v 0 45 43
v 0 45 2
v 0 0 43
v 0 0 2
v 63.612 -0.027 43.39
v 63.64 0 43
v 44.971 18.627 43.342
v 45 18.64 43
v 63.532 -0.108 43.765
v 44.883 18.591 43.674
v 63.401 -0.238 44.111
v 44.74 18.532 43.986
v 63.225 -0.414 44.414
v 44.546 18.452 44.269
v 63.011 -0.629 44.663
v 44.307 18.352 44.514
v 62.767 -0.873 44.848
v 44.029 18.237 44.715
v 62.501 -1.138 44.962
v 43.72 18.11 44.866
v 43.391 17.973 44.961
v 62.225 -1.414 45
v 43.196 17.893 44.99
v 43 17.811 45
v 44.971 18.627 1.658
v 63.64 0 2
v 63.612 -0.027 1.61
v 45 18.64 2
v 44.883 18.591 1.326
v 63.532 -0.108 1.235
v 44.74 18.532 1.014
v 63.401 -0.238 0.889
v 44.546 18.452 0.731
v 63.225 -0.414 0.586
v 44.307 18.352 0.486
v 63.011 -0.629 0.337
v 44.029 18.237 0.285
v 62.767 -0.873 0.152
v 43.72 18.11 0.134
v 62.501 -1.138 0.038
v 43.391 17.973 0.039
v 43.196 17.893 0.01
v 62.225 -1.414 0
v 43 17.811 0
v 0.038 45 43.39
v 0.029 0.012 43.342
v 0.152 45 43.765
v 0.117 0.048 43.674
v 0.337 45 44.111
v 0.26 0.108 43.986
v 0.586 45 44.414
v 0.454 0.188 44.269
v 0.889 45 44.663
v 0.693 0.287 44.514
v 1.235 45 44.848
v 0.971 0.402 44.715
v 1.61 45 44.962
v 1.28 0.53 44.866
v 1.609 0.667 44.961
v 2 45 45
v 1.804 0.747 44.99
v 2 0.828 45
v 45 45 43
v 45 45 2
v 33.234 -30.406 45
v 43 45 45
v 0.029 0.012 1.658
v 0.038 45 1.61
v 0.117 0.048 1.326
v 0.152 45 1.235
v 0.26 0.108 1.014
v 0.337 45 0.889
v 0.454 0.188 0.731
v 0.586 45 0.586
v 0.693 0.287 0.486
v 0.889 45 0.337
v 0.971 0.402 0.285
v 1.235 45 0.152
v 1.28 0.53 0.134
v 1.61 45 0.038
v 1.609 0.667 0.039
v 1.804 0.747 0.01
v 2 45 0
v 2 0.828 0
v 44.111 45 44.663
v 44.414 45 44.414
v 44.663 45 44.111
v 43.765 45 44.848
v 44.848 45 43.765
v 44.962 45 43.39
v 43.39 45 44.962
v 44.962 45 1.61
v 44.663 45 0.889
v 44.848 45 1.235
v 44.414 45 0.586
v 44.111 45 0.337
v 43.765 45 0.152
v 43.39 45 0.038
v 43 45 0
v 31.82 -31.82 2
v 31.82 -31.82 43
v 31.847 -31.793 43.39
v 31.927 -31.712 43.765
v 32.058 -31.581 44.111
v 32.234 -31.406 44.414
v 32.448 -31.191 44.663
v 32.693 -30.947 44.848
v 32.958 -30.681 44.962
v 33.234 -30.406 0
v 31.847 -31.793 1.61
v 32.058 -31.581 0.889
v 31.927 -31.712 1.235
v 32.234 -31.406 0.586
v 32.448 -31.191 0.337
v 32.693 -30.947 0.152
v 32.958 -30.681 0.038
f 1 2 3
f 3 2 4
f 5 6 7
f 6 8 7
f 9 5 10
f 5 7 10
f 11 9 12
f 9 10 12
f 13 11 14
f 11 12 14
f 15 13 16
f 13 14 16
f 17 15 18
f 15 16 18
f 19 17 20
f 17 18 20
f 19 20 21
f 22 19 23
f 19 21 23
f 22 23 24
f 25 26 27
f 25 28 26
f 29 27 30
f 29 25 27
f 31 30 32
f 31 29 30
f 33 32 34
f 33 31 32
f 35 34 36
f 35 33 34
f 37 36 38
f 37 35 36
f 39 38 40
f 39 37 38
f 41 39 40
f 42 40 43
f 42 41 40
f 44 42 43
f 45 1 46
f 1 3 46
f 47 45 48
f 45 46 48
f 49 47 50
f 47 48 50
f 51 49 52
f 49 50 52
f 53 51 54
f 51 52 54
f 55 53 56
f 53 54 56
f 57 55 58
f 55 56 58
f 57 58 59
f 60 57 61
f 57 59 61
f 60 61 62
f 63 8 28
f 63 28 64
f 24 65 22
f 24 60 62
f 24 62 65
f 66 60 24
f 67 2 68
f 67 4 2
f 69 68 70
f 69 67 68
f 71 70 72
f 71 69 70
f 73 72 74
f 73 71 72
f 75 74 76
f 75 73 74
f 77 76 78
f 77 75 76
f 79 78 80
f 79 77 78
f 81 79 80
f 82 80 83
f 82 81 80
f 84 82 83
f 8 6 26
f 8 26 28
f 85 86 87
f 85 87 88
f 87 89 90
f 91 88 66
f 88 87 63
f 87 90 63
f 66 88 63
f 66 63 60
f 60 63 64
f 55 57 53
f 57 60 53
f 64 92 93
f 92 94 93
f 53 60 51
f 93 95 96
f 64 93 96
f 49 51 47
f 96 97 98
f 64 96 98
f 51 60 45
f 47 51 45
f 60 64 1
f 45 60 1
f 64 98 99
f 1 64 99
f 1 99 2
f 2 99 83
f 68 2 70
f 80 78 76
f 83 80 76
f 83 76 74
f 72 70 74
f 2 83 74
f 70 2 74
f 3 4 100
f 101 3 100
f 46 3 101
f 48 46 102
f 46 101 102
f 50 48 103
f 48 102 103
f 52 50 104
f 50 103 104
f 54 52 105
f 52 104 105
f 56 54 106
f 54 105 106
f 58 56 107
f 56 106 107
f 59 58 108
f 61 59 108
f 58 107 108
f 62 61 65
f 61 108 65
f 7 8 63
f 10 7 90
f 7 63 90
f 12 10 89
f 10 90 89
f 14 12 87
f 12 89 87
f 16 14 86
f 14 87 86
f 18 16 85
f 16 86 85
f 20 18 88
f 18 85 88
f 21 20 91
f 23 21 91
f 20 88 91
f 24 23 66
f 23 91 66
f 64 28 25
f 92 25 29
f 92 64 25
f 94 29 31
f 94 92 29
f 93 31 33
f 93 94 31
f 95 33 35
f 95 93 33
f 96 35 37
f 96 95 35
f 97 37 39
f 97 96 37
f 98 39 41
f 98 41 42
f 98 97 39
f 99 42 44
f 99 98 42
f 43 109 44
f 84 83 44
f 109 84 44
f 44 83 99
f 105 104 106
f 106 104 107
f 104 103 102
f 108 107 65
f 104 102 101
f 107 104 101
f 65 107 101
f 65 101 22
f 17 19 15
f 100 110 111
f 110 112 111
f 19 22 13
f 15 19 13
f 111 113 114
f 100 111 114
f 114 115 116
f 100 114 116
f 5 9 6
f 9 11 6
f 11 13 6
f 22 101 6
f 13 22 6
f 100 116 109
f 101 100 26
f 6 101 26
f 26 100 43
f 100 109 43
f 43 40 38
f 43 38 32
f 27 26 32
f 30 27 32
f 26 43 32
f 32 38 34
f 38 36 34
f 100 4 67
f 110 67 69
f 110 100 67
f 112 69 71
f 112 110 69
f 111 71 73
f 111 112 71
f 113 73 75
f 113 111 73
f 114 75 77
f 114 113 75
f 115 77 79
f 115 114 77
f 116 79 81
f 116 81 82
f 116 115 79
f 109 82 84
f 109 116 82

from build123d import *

# Parameters (mm, degrees)
F1_DEPTH = 45
F2_R     = 2


with BuildPart() as f1:
    # F0 (on Top) → F1 (new body)
    with BuildSketch(Plane.XY):
        Polygon((0, 45), (0, 0), (31.819805, -31.819805), (63.63961, 0), (45, 18.63961), (45, 45), align=None)
    extrude(amount=F1_DEPTH)

    # F2
    f2_edges = [f1.edges().sort_by_distance(p)[0] for p in [
        (54.319805, 9.319805, 0),
        (45, 31.819805, 0),
        (15.909903, -15.909903, 0),
        (0, 22.5, 0),
        (54.319805, 9.319805, 45),
        (45, 31.819805, 45),
        (0, 22.5, 45),
        (15.909903, -15.909903, 45),
    ]]
    fillet(f2_edges, radius=F2_R)


solid = f1.part
